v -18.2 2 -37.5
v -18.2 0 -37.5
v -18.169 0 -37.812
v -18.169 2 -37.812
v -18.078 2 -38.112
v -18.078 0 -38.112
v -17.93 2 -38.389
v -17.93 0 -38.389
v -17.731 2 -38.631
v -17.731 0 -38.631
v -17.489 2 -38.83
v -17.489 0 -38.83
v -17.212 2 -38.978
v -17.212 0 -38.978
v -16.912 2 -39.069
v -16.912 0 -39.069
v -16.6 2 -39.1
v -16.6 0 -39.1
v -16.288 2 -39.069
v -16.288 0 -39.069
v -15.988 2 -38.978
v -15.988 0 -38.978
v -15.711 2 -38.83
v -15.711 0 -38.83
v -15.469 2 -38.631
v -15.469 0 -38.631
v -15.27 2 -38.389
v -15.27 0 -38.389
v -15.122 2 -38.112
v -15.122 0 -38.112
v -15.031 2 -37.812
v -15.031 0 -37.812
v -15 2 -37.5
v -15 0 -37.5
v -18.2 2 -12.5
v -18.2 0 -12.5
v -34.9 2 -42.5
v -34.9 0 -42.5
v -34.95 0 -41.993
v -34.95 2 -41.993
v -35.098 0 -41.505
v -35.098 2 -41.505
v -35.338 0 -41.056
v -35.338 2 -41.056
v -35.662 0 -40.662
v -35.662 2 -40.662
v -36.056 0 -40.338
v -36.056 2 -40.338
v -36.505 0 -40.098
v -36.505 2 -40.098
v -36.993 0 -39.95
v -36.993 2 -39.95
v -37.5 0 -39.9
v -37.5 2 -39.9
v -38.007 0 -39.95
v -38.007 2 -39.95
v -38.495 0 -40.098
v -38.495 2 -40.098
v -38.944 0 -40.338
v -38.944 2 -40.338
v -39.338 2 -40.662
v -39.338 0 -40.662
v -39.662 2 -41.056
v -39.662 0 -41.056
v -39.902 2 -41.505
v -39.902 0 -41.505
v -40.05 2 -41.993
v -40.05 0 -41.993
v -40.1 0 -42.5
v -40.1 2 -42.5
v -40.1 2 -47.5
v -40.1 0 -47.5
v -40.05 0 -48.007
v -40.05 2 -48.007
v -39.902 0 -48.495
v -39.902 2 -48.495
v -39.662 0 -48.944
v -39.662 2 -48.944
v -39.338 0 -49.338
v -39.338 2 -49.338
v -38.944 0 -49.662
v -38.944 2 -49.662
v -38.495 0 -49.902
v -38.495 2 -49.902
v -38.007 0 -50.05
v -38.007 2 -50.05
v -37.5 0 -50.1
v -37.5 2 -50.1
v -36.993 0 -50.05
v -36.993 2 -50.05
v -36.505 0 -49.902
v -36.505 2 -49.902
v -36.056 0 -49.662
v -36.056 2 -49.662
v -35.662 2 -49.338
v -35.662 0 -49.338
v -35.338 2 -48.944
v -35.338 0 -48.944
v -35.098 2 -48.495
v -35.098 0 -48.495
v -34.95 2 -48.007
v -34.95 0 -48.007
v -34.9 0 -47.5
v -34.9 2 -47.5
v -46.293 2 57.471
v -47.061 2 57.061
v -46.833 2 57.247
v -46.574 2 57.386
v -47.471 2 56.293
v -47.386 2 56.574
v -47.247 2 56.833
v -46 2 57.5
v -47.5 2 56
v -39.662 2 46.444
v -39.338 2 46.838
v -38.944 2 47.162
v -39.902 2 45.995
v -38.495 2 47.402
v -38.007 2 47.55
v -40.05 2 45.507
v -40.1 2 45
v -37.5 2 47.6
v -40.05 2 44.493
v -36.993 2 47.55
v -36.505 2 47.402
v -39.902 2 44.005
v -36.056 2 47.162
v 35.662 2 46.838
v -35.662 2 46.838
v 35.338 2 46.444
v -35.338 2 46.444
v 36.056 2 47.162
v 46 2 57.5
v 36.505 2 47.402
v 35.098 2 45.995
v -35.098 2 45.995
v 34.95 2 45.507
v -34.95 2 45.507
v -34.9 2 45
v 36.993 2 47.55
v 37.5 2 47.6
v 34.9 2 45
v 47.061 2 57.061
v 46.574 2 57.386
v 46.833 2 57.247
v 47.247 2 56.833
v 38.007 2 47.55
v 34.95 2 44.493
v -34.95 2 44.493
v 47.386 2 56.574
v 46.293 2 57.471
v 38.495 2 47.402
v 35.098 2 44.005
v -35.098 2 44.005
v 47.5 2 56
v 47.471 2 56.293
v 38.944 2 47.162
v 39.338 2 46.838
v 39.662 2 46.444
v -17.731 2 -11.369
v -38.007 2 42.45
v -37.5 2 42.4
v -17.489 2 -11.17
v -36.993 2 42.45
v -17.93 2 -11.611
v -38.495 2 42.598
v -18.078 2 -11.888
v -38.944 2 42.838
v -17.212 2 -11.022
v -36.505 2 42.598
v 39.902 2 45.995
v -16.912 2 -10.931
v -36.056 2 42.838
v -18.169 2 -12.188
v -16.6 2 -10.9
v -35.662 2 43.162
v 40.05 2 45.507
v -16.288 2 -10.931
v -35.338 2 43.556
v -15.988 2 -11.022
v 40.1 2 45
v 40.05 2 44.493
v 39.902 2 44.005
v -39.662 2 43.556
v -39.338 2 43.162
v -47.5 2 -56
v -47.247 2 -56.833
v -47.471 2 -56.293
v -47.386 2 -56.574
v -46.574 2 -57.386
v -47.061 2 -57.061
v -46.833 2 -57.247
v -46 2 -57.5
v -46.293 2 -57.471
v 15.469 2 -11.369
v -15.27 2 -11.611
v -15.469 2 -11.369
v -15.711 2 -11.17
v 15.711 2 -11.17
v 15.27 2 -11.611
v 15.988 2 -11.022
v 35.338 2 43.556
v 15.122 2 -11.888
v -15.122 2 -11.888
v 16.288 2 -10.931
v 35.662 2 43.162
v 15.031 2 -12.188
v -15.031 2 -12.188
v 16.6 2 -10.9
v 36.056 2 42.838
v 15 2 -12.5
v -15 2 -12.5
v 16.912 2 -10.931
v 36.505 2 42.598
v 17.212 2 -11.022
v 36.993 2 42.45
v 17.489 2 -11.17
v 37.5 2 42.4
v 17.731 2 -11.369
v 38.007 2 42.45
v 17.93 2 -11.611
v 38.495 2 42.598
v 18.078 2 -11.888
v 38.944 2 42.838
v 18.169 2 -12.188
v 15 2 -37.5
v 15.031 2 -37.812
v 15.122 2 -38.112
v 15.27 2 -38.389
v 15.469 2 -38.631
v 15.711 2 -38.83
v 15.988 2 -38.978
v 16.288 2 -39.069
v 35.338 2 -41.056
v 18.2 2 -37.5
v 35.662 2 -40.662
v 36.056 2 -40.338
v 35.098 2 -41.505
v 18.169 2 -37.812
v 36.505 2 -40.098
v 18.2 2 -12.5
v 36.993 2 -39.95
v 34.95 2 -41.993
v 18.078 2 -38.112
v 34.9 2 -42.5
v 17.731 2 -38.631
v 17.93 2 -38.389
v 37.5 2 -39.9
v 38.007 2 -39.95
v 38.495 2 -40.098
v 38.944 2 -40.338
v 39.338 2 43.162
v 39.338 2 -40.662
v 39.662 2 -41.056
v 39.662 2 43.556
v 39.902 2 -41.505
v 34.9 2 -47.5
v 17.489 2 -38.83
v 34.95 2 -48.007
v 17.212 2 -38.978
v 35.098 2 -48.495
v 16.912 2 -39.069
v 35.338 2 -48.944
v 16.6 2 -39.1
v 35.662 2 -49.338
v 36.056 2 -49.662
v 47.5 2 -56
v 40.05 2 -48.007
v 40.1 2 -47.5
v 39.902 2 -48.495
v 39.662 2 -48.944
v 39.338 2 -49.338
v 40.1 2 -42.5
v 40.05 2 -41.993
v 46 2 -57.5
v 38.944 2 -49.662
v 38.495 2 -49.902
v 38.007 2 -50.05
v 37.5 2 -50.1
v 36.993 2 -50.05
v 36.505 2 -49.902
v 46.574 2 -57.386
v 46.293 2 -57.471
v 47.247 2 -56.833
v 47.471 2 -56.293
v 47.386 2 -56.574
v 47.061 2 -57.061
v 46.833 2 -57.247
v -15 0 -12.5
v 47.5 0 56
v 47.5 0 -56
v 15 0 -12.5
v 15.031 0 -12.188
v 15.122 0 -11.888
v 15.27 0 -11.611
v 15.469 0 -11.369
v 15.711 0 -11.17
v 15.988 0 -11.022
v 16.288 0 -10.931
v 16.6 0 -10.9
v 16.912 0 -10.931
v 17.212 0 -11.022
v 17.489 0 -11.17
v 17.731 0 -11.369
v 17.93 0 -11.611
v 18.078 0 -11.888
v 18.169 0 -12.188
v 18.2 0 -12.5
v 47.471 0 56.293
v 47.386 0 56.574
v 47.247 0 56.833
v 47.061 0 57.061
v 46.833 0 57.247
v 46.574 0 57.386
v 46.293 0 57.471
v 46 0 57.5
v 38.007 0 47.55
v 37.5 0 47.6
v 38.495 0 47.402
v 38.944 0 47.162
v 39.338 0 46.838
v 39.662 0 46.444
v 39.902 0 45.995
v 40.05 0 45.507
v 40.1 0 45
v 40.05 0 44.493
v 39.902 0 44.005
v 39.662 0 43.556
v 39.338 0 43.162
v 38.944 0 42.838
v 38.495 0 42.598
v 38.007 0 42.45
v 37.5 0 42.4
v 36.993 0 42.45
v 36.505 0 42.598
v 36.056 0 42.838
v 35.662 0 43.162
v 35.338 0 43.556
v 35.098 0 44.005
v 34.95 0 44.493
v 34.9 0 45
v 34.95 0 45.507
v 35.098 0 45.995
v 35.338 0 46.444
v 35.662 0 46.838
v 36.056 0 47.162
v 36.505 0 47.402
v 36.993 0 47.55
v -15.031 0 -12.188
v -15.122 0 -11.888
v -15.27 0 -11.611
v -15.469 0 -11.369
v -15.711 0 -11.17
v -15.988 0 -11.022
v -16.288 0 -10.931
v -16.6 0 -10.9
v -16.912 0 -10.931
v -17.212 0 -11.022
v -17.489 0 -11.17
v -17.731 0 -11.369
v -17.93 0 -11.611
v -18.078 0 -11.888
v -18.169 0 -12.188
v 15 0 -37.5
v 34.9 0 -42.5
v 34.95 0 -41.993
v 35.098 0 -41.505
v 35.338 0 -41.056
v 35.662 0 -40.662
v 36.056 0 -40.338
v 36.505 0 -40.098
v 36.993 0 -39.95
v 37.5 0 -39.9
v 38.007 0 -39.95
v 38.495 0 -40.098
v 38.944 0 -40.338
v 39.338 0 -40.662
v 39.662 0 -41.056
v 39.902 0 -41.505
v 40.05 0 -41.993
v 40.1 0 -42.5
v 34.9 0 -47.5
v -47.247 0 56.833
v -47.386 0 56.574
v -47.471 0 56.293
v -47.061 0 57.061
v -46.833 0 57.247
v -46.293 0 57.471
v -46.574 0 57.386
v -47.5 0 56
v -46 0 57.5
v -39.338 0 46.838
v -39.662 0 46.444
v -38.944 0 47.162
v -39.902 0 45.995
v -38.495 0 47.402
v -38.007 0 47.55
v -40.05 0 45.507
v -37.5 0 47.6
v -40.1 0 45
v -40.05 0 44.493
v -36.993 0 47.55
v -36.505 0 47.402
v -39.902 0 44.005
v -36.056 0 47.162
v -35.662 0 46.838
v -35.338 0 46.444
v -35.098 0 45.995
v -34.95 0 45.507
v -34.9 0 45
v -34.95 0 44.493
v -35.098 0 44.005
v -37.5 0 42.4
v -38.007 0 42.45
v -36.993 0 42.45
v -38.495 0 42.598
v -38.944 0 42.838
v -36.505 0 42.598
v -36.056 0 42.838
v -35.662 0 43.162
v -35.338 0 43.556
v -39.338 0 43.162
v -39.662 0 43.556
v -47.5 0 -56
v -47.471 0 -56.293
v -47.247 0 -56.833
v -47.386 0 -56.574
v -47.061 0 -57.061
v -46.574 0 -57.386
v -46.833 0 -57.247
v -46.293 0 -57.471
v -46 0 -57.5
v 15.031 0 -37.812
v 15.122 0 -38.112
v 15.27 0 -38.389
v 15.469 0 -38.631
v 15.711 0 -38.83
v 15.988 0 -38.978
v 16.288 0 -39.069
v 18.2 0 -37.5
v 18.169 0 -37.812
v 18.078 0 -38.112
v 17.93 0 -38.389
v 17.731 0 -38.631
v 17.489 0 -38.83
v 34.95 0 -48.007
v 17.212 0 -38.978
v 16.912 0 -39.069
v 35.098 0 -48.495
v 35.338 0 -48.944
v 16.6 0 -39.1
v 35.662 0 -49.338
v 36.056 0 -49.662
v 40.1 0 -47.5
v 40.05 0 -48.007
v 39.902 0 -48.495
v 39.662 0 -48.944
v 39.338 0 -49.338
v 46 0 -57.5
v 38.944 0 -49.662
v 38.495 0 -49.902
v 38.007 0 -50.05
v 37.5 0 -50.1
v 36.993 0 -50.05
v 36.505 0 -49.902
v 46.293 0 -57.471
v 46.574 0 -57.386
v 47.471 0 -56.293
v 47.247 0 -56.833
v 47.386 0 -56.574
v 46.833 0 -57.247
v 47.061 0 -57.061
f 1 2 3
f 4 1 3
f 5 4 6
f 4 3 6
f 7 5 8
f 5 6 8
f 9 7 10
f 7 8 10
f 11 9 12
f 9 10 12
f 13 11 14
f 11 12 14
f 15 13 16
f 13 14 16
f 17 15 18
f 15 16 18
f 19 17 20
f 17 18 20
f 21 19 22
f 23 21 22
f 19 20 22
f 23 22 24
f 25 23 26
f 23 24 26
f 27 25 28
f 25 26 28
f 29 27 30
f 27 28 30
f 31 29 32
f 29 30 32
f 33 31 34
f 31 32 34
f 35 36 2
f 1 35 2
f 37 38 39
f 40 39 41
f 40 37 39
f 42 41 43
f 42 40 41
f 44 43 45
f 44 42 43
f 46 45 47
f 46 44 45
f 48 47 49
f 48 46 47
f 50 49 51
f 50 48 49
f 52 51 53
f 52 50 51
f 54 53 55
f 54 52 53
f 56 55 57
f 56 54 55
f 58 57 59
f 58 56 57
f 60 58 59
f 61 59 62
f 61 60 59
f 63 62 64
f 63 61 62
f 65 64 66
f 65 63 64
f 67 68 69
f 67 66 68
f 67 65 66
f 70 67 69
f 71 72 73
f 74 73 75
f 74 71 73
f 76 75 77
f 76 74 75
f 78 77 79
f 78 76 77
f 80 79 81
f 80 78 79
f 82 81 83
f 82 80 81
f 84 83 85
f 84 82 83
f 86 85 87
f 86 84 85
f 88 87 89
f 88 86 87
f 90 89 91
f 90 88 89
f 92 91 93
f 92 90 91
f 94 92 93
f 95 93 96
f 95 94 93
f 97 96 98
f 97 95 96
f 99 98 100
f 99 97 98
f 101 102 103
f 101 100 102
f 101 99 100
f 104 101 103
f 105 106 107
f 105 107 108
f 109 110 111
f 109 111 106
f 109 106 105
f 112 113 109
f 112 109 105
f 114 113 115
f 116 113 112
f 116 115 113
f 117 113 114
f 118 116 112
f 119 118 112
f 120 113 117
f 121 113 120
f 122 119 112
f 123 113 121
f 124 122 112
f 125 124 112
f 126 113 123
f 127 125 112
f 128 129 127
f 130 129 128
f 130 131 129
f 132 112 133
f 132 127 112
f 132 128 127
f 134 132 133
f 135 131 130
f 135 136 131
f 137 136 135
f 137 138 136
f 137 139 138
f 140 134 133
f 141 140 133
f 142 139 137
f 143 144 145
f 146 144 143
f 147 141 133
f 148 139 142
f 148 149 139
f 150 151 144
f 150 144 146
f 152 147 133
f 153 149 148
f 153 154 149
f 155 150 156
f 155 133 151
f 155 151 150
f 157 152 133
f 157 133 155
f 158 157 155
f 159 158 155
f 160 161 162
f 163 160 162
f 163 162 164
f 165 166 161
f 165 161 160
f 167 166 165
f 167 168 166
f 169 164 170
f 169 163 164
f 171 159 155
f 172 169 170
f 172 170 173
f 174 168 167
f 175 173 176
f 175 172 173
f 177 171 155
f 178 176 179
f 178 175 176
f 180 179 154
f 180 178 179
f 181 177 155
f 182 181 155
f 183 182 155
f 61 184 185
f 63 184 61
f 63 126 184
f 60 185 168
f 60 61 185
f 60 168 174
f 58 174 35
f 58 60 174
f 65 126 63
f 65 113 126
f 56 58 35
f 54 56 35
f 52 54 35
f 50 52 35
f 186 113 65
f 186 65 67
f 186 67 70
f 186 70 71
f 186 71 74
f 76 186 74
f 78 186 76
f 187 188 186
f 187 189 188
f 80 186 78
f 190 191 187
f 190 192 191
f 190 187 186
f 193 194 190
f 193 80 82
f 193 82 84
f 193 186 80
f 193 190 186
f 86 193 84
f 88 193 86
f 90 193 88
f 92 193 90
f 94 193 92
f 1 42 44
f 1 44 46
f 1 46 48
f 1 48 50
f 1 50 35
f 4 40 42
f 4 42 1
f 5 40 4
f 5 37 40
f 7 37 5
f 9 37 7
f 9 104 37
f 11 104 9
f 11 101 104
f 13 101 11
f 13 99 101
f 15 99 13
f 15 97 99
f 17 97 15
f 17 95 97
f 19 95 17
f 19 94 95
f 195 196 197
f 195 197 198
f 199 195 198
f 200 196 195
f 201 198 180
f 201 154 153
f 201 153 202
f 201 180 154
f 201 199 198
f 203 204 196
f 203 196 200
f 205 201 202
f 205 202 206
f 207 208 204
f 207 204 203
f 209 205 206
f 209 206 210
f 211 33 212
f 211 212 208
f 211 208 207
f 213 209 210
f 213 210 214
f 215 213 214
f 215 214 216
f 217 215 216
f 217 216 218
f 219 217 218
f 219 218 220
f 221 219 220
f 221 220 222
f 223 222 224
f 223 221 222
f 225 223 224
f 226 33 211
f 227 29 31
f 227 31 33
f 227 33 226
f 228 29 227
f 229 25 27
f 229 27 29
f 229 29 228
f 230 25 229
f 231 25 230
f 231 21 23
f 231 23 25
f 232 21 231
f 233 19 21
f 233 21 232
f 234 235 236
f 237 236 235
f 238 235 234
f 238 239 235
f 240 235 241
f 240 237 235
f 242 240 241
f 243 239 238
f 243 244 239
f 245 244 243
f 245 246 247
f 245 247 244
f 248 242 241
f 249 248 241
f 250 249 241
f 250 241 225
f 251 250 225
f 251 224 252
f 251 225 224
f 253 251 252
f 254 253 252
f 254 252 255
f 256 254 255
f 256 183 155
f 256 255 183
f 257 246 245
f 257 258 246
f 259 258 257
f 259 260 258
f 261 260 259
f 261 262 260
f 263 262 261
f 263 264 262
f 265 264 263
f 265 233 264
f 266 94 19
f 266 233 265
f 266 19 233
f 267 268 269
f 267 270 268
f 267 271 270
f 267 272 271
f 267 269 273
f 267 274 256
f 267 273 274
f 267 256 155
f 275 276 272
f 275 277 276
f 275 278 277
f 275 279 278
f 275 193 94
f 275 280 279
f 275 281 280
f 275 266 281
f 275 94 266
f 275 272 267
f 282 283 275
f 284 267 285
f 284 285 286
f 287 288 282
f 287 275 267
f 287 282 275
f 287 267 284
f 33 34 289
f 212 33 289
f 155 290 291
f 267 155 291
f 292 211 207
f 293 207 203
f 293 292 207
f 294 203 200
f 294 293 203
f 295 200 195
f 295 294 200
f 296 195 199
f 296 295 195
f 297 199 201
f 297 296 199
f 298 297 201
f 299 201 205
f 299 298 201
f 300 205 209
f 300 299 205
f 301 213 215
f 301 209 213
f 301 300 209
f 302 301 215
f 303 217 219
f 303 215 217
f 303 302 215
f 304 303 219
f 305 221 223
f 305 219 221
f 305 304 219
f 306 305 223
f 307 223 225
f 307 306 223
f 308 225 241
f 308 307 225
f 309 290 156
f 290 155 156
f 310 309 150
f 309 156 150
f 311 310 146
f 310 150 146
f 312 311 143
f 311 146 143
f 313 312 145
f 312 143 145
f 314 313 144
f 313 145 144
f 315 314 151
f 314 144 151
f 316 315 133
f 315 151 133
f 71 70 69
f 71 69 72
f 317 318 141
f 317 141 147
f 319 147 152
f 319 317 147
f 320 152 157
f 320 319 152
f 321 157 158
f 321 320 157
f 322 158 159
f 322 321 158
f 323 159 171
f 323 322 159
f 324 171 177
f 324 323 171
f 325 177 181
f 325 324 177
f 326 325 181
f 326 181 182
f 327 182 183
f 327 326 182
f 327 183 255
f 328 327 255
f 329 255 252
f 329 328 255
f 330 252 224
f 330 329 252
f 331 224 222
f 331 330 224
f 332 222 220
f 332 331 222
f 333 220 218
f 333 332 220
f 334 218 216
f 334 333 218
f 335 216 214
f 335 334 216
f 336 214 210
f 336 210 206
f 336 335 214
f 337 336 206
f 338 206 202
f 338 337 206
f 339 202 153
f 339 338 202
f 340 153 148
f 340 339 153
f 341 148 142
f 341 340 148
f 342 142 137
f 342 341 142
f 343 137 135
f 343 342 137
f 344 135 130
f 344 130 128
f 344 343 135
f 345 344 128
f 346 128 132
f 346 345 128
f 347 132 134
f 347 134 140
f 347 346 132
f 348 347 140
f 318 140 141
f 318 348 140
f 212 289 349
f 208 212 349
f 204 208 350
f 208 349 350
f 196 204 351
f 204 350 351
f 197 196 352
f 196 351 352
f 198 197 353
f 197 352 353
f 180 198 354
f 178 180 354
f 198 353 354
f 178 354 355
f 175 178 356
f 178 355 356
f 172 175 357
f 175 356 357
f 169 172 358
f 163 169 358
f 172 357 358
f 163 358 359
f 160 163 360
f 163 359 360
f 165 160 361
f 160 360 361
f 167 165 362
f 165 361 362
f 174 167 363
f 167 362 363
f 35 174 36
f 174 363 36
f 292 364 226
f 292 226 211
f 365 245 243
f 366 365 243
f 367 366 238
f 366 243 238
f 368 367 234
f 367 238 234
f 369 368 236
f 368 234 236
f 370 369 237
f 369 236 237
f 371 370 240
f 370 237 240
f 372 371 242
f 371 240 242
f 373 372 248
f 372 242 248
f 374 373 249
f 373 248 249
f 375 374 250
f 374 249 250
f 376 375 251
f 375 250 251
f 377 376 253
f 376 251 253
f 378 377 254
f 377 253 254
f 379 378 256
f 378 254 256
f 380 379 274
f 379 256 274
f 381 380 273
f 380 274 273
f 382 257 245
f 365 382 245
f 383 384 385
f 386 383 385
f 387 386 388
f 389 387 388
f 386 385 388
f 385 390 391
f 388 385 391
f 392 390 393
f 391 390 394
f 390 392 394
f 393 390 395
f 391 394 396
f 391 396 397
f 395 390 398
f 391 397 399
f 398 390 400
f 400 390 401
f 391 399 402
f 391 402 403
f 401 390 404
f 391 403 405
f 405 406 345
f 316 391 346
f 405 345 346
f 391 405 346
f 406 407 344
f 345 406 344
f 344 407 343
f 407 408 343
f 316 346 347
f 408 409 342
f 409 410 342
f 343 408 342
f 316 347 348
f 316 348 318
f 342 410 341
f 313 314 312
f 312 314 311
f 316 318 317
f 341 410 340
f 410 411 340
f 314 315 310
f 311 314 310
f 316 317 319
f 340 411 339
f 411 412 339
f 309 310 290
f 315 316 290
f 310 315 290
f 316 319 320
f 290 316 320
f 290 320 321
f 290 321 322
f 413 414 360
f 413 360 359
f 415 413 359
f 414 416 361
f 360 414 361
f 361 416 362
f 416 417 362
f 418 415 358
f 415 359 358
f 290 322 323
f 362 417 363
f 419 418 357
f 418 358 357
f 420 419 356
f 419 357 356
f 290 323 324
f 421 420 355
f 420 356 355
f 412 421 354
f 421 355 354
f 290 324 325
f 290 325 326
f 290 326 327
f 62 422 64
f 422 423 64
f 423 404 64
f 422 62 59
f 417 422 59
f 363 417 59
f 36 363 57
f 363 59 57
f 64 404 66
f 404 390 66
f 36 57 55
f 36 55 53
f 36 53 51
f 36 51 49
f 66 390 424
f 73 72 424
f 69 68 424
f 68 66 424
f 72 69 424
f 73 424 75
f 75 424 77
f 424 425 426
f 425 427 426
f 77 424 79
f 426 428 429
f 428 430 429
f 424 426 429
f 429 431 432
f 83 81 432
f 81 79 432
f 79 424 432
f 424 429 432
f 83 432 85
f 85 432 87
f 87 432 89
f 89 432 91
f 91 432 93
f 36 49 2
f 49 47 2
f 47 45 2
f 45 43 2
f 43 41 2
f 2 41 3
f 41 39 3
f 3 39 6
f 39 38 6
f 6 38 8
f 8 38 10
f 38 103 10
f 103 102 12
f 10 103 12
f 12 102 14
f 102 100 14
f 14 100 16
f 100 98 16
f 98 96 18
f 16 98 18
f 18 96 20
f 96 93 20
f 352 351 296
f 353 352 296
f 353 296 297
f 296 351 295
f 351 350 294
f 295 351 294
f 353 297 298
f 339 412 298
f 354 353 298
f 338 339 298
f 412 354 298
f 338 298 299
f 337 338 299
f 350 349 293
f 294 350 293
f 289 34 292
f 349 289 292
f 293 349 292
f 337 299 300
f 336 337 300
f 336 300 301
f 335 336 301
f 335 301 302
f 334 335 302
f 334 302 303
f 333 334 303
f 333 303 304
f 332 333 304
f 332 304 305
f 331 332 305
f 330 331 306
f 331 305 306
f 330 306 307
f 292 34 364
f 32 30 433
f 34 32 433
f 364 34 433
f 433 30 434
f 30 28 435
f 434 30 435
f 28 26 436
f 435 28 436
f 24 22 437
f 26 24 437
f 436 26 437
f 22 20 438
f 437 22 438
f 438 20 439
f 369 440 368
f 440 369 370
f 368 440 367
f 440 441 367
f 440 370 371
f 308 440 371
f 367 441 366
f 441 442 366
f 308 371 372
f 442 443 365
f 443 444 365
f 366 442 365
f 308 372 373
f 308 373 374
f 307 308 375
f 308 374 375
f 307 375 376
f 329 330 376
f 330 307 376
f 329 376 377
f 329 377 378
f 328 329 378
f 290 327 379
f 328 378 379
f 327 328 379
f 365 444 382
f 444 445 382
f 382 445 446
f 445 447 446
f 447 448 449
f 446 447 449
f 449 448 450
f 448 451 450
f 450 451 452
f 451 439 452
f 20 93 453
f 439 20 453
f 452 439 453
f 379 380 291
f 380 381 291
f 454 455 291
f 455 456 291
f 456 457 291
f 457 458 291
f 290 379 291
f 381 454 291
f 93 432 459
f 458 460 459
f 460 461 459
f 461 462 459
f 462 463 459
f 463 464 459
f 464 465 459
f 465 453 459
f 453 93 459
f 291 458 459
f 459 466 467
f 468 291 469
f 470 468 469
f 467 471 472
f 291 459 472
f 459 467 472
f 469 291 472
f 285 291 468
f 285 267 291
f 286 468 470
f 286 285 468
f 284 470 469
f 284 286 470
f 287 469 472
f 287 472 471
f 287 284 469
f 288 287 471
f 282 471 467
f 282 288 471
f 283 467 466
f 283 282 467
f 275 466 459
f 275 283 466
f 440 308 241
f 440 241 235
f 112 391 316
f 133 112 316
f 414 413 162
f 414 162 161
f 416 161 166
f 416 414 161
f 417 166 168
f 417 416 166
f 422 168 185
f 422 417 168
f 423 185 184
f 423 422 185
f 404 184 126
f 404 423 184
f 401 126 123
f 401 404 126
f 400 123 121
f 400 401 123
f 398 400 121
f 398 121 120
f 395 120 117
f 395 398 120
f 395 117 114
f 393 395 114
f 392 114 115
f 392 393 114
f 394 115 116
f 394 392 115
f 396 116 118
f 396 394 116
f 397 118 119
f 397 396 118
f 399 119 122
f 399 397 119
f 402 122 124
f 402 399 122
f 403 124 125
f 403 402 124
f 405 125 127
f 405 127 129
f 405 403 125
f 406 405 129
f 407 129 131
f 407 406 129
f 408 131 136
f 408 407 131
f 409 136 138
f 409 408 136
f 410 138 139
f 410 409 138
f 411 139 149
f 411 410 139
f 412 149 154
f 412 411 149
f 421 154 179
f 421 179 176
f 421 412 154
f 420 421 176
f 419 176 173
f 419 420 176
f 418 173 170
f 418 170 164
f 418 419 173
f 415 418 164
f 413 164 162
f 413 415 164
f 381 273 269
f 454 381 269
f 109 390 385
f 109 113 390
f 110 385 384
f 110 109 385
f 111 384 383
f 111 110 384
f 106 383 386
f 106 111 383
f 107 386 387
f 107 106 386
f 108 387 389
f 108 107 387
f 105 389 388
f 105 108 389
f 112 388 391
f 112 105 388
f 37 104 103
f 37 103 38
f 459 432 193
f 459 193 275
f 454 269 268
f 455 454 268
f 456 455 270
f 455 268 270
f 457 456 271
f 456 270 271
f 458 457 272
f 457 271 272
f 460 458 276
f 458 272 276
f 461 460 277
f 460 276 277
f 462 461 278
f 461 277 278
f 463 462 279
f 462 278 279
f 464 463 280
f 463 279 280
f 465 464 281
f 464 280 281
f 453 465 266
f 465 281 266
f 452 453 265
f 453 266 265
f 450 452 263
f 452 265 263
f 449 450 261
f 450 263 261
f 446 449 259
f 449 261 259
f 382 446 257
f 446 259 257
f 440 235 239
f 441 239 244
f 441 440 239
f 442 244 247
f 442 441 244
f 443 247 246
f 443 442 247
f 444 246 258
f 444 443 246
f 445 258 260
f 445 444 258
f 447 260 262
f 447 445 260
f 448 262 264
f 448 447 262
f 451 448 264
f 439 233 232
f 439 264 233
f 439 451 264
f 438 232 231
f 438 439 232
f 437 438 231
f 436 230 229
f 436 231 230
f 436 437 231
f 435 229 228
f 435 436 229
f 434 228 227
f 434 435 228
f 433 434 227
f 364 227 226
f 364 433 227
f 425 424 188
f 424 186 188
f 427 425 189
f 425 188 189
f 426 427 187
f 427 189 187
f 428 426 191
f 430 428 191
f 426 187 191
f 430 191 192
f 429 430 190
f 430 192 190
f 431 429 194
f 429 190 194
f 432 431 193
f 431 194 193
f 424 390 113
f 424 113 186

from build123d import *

# Parameters (mm, degrees)
SKETCH1_W           = 95
SKETCH1_H           = 115
SKETCH1_R           = 2.6
BOSS_EXTRUDE1_DEPTH = 2
CUT_EXTRUDE1_DEPTH  = 75.608980693
FILLET1_R           = 1.5
CUT_EXTRUDE2_DEPTH  = 75.608980693


with BuildPart() as part:
    # Sketch1 → Boss-Extrude1 (new body)
    with BuildSketch(Plane(origin=(0, 0, 0), x_dir=(1, 0, 0), z_dir=(0, 1, 0))):
        Rectangle(SKETCH1_W, SKETCH1_H)
        with Locations(Location((-37.5, 45, 0), (0, 0, 270))):
            Circle(SKETCH1_R, mode=Mode.SUBTRACT)
        with Locations(Location((37.5, 45, 0), (0, 0, 90))):
            Circle(SKETCH1_R, mode=Mode.SUBTRACT)
        with Locations(Location((37.5, -45, 0), (0, 0, 270))):
            Circle(SKETCH1_R, mode=Mode.SUBTRACT)
        with Locations(Location((-37.5, -45, 0), (0, 0, 90))):
            Circle(SKETCH1_R, mode=Mode.SUBTRACT)
    extrude(amount=BOSS_EXTRUDE1_DEPTH)

    # Sketch2 → Cut-Extrude1 (cut, through all)
    with BuildSketch(Plane(origin=(0, 2, 0), x_dir=(1, 0, 0), z_dir=(0, 1, 0))):
        with BuildLine():
            Line((-34.9, 47.5), (-34.9, 42.5))
            ThreePointArc((-34.9, 42.5), (-37.5, 39.9), (-40.1, 42.5))
            Line((-40.1, 42.5), (-40.1, 47.5))
            ThreePointArc((-40.1, 47.5), (-37.5, 50.1), (-34.9, 47.5))
        make_face()
        with BuildLine():
            Line((34.9, 47.5), (34.9, 42.5))
            ThreePointArc((34.9, 42.5), (37.5, 39.9), (40.1, 42.5))
            Line((40.1, 42.5), (40.1, 47.5))
            ThreePointArc((40.1, 47.5), (37.5, 50.1), (34.9, 47.5))
        make_face()
    extrude(amount=-CUT_EXTRUDE1_DEPTH, mode=Mode.SUBTRACT)

    # Fillet1
    fillet1_edges = [part.edges().sort_by_distance(p)[0] for p in [
        (47.5, 1, 57.5),
        (-47.5, 1, 57.5),
        (-47.5, 1, -57.5),
        (47.5, 1, -57.5),
    ]]
    fillet(fillet1_edges, radius=FILLET1_R)

    # Sketch3 → Cut-Extrude2 (cut, through all)
    with BuildSketch(Plane.XZ):
        with BuildLine():
            Line((15, -37.5), (15, -12.5))
            ThreePointArc((15, -12.5), (16.6, -10.9), (18.2, -12.5))
            Line((18.2, -12.5), (18.2, -37.5))
            ThreePointArc((18.2, -37.5), (16.6, -39.1), (15, -37.5))
        make_face()
        with BuildLine():
            Line((-15, -37.5), (-15, -12.5))
            ThreePointArc((-15, -12.5), (-16.6, -10.9), (-18.2, -12.5))
            Line((-18.2, -12.5), (-18.2, -37.5))
            ThreePointArc((-18.2, -37.5), (-16.6, -39.1), (-15, -37.5))
        make_face()
    extrude(amount=-CUT_EXTRUDE2_DEPTH, mode=Mode.SUBTRACT)


solid = part.part
